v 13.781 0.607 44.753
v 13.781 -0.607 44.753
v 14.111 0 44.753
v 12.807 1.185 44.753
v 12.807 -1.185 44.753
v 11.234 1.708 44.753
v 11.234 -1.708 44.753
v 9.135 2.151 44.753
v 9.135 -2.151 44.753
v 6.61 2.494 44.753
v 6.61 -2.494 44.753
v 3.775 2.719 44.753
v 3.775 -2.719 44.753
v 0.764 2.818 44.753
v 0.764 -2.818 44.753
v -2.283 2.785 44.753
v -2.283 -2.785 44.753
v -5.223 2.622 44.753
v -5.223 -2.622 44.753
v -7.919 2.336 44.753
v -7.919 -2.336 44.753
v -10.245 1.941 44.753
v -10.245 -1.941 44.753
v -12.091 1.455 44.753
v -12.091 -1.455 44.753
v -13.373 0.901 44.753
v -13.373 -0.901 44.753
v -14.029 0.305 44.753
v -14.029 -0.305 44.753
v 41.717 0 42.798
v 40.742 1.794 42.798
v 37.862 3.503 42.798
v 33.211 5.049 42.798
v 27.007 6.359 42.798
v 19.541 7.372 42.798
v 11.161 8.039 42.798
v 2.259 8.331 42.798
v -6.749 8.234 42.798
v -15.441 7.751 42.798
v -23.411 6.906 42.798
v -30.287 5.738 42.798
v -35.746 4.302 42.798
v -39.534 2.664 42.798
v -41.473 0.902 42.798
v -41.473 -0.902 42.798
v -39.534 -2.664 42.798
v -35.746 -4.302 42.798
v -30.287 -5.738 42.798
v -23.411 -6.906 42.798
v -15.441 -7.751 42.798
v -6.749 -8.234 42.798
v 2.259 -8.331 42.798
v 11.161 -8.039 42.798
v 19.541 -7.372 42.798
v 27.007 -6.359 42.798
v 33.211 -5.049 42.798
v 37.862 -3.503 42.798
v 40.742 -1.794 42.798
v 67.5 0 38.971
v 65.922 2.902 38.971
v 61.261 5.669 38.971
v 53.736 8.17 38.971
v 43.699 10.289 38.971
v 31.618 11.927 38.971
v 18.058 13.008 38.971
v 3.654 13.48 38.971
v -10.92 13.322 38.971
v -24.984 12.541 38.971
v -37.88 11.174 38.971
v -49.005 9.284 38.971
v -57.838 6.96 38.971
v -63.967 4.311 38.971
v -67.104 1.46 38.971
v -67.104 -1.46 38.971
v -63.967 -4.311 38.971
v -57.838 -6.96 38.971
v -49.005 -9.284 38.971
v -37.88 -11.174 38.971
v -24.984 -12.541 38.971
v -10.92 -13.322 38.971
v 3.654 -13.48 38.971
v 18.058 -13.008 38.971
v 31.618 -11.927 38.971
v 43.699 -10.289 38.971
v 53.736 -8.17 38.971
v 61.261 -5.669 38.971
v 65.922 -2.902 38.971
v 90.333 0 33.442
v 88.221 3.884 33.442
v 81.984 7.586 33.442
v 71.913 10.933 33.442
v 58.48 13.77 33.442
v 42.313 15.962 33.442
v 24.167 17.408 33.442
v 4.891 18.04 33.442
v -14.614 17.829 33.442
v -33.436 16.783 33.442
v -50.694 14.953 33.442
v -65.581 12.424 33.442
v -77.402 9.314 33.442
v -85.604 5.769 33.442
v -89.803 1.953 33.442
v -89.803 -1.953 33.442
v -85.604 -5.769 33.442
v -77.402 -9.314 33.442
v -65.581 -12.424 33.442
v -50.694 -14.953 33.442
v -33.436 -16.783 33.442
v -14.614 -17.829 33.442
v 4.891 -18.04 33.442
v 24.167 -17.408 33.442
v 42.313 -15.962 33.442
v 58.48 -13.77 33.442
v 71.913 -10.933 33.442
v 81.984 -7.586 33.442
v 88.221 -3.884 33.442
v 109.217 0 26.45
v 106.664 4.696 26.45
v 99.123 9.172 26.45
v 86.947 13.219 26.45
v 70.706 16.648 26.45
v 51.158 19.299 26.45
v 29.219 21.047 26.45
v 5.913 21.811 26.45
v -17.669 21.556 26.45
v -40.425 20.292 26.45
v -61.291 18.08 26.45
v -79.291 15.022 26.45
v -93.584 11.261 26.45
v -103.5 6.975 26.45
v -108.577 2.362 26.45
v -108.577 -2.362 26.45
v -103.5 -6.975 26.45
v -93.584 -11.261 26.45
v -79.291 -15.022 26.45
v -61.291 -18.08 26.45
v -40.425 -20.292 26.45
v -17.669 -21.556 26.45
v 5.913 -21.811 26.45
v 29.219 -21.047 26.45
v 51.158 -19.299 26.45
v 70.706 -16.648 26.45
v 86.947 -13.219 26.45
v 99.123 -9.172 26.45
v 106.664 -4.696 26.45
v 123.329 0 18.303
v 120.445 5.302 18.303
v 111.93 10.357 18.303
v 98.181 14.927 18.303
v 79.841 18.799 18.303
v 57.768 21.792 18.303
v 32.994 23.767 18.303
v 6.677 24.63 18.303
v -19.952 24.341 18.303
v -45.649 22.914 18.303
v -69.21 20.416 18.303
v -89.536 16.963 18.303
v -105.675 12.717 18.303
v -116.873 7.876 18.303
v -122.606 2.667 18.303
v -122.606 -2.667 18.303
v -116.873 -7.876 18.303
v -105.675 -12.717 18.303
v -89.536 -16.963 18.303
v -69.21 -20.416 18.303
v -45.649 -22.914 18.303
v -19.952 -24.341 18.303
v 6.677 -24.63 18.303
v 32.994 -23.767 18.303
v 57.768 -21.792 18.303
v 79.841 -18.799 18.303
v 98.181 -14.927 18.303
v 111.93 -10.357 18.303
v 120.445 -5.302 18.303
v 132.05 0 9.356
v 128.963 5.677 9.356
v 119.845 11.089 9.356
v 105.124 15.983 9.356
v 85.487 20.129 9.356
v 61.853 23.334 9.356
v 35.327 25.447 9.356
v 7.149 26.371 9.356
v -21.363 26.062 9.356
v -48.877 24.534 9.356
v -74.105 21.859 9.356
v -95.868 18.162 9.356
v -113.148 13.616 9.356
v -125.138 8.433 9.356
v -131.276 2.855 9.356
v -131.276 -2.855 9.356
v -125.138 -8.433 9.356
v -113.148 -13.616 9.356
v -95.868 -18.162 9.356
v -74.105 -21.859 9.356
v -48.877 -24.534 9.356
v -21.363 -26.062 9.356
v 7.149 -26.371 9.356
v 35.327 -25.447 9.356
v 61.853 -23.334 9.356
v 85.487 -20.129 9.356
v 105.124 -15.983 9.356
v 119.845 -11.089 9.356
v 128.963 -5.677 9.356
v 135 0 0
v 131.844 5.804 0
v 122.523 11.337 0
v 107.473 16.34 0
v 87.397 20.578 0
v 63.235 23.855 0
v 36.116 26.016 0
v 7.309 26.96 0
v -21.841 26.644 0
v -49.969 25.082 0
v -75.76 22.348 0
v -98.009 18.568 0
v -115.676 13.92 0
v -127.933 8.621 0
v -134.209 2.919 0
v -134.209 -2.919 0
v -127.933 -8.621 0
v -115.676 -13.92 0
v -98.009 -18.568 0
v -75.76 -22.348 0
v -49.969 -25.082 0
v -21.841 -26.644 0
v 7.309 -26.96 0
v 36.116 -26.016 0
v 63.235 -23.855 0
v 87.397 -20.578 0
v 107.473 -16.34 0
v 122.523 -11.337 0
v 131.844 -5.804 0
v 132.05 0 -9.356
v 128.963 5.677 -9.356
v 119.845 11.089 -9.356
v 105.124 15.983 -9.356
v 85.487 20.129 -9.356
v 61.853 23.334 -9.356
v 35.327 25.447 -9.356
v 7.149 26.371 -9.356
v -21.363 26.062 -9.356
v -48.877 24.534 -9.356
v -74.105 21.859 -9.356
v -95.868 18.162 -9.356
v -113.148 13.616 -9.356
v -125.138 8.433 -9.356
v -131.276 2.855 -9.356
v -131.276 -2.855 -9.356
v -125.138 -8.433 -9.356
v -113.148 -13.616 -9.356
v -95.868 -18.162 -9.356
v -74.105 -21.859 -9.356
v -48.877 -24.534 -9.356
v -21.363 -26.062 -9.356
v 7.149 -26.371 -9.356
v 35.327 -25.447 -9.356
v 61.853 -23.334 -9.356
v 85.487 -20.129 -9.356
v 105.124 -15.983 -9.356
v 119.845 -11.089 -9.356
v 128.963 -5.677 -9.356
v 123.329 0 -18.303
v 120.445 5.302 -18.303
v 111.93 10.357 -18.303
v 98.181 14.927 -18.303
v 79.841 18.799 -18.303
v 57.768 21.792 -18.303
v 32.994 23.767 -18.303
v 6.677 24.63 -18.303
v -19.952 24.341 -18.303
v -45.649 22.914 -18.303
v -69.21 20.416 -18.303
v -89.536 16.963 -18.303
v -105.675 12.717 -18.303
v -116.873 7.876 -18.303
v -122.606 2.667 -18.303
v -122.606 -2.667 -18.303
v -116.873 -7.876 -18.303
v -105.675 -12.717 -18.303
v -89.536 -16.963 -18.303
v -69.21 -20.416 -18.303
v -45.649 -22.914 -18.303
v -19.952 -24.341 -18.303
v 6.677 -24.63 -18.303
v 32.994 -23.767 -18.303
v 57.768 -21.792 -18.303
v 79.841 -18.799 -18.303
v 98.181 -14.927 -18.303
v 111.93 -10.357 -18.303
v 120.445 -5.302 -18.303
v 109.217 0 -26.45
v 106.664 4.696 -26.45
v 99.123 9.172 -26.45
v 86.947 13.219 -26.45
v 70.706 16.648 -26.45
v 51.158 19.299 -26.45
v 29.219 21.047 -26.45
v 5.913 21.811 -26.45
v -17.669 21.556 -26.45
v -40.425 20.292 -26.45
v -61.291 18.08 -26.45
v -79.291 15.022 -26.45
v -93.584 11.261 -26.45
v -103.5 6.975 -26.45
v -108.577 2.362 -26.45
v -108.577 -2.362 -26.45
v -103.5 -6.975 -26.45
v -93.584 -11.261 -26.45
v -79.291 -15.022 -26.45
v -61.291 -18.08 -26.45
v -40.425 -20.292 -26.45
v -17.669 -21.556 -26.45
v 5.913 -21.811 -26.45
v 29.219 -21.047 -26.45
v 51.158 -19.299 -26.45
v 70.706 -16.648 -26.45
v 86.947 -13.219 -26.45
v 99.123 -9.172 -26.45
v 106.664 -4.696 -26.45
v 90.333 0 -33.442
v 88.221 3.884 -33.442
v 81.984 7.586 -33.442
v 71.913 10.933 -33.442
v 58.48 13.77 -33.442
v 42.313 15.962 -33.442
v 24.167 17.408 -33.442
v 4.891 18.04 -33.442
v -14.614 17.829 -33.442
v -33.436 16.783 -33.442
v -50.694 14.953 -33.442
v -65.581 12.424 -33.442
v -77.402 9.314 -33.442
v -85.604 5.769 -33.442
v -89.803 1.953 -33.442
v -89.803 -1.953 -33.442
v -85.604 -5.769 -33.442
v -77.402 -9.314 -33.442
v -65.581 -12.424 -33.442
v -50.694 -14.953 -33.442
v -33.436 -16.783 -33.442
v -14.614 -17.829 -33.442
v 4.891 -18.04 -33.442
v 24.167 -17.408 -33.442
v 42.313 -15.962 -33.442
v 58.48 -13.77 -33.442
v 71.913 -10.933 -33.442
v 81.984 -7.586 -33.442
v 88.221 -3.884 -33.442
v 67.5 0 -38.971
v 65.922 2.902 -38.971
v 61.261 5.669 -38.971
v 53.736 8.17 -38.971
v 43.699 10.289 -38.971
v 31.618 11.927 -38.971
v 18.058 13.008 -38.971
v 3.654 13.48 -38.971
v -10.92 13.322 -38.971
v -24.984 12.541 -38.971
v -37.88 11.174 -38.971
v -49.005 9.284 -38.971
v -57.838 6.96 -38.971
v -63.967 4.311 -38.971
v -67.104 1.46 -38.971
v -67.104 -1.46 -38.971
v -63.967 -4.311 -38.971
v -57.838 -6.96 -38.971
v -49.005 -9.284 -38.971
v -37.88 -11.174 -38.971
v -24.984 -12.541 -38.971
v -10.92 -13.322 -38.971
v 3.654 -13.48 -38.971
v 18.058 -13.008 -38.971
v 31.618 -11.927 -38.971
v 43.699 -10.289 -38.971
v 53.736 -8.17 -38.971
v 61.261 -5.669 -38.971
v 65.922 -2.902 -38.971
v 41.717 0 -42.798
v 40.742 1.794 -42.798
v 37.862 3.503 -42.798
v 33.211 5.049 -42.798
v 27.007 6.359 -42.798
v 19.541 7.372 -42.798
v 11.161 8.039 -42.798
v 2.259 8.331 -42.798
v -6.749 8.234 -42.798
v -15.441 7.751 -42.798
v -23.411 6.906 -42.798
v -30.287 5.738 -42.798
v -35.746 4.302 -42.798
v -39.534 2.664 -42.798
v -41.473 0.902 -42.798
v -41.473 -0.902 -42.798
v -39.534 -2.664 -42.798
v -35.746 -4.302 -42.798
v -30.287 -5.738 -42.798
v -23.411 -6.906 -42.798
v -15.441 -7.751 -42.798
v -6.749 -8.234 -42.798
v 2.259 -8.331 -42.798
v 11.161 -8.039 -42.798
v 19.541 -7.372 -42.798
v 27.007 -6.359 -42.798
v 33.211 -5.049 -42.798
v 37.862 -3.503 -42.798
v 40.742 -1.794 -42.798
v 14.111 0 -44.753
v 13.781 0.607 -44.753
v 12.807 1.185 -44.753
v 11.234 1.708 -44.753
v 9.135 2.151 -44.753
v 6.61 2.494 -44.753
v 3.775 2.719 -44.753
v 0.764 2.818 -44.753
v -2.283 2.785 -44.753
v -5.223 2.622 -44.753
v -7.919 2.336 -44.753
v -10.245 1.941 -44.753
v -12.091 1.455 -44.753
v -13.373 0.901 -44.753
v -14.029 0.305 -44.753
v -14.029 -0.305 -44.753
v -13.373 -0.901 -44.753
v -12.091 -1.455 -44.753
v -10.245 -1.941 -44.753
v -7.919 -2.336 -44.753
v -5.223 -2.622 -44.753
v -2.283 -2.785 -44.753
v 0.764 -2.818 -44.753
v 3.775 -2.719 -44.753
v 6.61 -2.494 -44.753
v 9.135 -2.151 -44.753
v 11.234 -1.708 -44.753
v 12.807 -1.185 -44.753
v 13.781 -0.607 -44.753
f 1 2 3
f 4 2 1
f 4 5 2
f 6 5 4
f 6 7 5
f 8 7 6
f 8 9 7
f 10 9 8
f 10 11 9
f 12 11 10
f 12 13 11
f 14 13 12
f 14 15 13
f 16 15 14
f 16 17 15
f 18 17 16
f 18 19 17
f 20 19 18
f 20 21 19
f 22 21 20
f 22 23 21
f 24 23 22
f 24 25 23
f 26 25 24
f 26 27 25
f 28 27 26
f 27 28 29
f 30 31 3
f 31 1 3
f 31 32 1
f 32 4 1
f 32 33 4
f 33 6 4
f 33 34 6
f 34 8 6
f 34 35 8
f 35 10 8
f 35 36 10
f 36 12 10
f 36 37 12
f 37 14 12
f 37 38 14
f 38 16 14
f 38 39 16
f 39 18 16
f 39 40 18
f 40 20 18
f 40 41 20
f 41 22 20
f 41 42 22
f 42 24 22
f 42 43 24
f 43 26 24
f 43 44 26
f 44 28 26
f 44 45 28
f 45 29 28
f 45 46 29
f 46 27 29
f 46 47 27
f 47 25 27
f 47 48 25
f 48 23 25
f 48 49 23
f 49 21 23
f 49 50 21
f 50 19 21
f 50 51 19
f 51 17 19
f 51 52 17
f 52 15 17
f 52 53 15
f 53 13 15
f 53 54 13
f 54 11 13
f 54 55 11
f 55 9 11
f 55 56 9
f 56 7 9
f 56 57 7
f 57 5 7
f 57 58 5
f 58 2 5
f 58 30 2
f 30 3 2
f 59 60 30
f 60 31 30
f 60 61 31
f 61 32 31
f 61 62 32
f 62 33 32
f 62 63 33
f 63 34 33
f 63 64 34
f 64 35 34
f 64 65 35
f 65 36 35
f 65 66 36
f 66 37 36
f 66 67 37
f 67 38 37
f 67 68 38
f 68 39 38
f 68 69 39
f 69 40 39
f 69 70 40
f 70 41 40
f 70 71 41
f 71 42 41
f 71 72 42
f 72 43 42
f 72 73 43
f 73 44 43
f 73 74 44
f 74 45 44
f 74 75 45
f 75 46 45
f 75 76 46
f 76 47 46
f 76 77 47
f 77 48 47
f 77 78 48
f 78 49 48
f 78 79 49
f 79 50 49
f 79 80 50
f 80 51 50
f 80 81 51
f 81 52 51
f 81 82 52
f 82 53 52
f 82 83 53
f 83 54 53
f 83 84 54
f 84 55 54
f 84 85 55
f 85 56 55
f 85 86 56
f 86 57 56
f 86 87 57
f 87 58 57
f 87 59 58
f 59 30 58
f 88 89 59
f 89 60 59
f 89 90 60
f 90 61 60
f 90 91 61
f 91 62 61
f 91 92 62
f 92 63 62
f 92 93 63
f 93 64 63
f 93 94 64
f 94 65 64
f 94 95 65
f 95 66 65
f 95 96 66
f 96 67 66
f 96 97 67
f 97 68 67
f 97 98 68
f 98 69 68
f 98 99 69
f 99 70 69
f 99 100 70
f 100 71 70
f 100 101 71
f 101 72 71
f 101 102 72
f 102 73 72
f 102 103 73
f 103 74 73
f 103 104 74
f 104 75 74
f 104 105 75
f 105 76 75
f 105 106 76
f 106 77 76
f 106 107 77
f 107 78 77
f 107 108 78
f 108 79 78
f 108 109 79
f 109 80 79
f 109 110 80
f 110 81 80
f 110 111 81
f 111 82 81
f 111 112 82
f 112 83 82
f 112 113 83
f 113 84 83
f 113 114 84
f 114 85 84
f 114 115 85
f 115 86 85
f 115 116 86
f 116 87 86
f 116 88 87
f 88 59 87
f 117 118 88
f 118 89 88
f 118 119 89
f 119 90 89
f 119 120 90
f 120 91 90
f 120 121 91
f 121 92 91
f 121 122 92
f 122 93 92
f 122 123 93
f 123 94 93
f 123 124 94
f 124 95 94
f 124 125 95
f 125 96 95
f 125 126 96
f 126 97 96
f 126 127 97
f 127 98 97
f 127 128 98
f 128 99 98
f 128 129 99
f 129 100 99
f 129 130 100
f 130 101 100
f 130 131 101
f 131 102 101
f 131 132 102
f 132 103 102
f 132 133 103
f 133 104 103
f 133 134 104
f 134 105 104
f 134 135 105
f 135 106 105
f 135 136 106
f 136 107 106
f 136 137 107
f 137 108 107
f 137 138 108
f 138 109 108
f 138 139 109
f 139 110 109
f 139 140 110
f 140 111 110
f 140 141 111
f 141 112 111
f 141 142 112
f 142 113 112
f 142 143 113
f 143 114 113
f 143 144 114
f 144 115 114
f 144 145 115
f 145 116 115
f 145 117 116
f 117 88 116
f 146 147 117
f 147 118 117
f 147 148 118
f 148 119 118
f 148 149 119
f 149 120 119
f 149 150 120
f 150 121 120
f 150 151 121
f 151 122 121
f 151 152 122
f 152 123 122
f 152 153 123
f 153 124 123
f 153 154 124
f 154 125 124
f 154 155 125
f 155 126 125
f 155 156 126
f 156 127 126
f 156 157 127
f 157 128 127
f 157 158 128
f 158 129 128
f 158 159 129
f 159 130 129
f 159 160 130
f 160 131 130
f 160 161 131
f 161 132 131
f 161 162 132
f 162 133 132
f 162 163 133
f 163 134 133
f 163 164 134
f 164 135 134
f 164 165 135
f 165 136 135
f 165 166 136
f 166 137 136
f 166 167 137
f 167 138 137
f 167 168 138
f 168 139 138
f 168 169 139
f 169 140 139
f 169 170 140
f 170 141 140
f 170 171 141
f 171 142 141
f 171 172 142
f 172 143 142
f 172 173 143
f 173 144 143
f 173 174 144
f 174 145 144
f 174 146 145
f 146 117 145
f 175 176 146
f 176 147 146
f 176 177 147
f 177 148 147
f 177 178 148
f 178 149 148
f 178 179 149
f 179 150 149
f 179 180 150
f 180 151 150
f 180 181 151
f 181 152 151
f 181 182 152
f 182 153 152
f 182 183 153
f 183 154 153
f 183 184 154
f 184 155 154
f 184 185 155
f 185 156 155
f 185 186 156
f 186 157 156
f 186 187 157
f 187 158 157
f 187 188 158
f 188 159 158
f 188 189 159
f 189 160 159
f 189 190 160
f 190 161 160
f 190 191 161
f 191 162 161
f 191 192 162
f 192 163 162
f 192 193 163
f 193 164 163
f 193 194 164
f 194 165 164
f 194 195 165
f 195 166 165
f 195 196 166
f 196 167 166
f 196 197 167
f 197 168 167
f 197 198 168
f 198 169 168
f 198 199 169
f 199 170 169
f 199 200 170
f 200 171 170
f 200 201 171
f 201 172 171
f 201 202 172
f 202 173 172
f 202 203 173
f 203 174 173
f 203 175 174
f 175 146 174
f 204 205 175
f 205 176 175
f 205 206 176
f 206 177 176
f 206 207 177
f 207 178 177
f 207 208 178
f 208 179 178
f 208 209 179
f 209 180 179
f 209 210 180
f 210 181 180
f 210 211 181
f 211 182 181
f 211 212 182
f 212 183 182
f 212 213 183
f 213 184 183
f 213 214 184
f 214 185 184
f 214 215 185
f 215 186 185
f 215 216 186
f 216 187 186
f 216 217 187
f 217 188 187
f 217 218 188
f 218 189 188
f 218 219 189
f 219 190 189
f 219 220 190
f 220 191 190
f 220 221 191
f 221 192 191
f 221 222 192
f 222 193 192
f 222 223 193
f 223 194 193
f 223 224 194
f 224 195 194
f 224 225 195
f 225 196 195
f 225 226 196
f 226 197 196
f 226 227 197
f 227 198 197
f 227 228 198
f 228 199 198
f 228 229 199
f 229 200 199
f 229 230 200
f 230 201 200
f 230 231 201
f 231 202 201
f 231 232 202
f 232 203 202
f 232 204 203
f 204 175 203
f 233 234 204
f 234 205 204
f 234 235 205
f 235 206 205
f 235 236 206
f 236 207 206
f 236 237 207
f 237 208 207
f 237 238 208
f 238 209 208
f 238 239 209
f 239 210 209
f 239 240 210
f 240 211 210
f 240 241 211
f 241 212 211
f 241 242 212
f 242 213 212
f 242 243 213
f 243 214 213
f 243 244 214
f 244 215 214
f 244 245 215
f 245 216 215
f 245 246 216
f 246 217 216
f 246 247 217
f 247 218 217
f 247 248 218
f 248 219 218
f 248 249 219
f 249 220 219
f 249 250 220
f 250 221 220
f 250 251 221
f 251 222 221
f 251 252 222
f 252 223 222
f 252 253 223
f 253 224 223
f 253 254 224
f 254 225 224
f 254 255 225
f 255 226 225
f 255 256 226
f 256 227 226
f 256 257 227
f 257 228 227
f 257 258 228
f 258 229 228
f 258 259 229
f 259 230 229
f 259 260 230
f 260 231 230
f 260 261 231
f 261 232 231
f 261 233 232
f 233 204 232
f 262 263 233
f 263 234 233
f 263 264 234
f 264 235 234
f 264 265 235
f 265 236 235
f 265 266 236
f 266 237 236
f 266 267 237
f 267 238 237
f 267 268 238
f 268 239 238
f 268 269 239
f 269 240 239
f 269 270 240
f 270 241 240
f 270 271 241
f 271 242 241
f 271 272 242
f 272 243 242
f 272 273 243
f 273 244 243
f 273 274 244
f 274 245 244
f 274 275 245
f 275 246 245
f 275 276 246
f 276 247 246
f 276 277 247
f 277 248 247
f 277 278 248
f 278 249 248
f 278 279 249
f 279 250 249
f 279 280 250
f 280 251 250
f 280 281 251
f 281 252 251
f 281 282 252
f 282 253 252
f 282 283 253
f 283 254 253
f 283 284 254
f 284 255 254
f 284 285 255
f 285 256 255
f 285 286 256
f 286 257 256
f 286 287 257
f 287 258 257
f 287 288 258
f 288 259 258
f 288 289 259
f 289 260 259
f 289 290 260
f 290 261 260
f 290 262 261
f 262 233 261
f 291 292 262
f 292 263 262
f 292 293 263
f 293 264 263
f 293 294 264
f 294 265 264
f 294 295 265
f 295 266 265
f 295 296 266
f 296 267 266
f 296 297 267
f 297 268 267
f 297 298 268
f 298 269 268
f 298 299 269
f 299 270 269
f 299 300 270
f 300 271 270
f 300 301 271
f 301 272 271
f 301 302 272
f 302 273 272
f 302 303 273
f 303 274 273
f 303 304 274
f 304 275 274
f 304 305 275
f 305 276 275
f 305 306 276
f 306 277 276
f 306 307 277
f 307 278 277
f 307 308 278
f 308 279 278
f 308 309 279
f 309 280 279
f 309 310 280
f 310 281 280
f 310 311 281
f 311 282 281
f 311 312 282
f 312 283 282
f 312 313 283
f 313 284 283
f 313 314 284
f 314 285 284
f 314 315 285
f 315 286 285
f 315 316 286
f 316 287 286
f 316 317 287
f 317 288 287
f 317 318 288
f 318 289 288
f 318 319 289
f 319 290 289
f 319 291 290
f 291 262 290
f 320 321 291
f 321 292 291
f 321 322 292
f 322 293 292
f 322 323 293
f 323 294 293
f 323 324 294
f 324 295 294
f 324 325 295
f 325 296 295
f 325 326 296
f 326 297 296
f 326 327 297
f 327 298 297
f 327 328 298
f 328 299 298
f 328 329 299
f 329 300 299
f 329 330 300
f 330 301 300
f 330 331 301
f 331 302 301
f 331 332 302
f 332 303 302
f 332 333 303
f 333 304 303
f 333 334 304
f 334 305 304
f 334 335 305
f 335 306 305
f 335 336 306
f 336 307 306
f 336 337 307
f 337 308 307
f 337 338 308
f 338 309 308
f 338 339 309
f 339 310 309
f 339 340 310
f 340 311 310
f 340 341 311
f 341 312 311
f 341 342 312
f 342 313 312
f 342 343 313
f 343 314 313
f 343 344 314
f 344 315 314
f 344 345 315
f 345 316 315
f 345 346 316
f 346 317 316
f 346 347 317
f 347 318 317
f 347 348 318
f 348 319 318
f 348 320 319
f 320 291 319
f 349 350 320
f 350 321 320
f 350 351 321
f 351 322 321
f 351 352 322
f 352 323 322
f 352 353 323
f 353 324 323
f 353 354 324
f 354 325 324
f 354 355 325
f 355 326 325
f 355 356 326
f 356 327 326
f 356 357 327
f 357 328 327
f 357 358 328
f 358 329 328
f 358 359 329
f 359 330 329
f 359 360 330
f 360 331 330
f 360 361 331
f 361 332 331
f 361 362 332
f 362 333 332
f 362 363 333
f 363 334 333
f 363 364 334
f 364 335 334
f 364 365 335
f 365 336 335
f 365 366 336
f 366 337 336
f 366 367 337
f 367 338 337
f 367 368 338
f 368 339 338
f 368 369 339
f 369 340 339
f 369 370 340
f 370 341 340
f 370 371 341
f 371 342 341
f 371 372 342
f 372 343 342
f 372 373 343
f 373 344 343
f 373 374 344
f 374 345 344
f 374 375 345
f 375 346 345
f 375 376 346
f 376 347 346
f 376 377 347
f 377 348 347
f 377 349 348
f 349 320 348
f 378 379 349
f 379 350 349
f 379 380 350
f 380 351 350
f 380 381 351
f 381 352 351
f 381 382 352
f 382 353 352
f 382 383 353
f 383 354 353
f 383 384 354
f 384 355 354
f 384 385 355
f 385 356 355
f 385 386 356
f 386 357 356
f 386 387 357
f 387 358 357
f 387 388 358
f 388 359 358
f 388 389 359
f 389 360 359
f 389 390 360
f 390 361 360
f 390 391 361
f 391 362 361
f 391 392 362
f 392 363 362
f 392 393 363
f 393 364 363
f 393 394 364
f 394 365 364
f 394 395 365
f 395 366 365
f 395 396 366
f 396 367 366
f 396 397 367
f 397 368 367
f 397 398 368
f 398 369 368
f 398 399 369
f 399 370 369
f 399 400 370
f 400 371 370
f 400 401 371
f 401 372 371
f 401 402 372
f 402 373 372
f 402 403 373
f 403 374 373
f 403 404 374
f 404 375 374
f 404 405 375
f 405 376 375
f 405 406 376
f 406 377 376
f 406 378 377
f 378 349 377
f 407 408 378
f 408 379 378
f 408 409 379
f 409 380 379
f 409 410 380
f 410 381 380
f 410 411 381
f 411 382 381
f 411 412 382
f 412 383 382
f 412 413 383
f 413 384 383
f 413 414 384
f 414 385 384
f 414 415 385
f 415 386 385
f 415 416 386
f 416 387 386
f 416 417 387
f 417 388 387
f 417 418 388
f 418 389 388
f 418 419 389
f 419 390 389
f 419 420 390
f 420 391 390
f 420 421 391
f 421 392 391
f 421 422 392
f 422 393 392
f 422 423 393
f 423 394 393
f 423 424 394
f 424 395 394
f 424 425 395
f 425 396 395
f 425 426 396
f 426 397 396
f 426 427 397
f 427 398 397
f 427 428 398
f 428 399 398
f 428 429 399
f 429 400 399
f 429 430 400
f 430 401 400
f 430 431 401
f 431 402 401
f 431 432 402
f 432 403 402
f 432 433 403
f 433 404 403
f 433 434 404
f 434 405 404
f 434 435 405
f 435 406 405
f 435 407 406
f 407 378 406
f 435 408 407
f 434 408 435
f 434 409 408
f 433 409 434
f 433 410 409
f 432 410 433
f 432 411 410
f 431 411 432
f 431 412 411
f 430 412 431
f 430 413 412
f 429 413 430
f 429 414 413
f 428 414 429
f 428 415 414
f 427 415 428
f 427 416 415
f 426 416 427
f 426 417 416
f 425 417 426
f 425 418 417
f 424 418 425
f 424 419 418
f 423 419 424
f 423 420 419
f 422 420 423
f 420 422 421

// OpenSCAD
// Generated by SolidPython 1.0.1 on 2020-07-29 00:46:51


scale(v = [15, 3, 5]) {
	sphere(r = 9);
}
/***********************************************
*********      SolidPython code:      **********
************************************************
 
# import packages: SolidPython
from solid import *
from solid.utils import *
from itertools import chain, combinations, permutations


class Resize:

    def __init__(self, scad_file):
        self.scad_file = scad_file
        #self.scad_file = import_scad(scad_file)
        # cone/cylinder param:
        self.r1 = 0
        self.r2 = 0
        self.h = 0
        # rectangular prism param:
        self.w = 0
        self.l = 0
        # ellipse param:
        self.r = 0

    # import OpenScad code (file name corresponds to shape)


    # classify shape + parameters
    def assign(self, param1, param2, param3):
        if self.scad_file == 'cone.scad':
            self.r1 = param1
            self.r2 = param2
            self.h = param3
        elif self.scad_file == 'cylinder.scad':
            self.r1 = param1
            self.r2 = param2
            self.h = param3
        elif self.scad_file == 'rectangularPrism.scad':
            self.h = param1
            self.l = param2
            self.w = param3
        else:
            self.r = param1
            self.h = param2

    # resize parameters
    def iterate(self):
        x = range(3, 20, 2)
        i = 1
        if self.scad_file == 'cone.scad':
            tempList = list(permutations(x, 2))
            for temp in tempList:
                param1 = temp[0]
                param2 = temp[1]
                filepath = 'produced_scad_files/' + 'cone' + str(param1) + '_' + str(param2) + '_' + '.scad'
                scad_render_to_file(cylinder(h=param1, r1=param2, r2=0), filepath)

        elif self.scad_file == 'cylinder.scad':
            tempList = list(permutations(x, 3))
            for temp in tempList:
                param1 = temp[0]
                param2 = temp[1]
                filepath = 'produced_scad_files/' + 'cylinder' + str(param1) + '_' + str(param2) + '_' + '.scad'
                scad_render_to_file(cylinder(h=param1, r1=param2, r2=param2), filepath)

        elif self.scad_file == 'rectangularPrism.scad':
            tempList = list(permutations(x, 3))
            for temp in tempList:
                param1 = temp[0]
                param2 = temp[1]
                param3 = temp[2]
                filepath = 'produced_scad_files/' + 'rectangularPrism' + str(param1) + '_' + str(param2) + '_' + str(
                    param3) + '.scad'
                scad_render_to_file(cube(size=(param1, param2, param3)), filepath)

        elif self.scad_file == 'ellipse.scad':
            tempList = list(permutations(x, 4))
            for temp in tempList:
                param1 = temp[0]
                param2 = temp[1]
                param3 = temp[2]
                param4 = temp[3]
                filepath = 'produced_scad_files/' + 'ellipse' + str(param1) + '_' + str(param2) + '_' + str(param3) + '_' + str(param4) + '.scad'
                scad_render_to_file(scale([param1, param2, param3])(sphere(r=param4)), filepath)

    def render_to_scadfile(self):
        scad_render_to_file(scad, 'example.scad') 
 
************************************************/
